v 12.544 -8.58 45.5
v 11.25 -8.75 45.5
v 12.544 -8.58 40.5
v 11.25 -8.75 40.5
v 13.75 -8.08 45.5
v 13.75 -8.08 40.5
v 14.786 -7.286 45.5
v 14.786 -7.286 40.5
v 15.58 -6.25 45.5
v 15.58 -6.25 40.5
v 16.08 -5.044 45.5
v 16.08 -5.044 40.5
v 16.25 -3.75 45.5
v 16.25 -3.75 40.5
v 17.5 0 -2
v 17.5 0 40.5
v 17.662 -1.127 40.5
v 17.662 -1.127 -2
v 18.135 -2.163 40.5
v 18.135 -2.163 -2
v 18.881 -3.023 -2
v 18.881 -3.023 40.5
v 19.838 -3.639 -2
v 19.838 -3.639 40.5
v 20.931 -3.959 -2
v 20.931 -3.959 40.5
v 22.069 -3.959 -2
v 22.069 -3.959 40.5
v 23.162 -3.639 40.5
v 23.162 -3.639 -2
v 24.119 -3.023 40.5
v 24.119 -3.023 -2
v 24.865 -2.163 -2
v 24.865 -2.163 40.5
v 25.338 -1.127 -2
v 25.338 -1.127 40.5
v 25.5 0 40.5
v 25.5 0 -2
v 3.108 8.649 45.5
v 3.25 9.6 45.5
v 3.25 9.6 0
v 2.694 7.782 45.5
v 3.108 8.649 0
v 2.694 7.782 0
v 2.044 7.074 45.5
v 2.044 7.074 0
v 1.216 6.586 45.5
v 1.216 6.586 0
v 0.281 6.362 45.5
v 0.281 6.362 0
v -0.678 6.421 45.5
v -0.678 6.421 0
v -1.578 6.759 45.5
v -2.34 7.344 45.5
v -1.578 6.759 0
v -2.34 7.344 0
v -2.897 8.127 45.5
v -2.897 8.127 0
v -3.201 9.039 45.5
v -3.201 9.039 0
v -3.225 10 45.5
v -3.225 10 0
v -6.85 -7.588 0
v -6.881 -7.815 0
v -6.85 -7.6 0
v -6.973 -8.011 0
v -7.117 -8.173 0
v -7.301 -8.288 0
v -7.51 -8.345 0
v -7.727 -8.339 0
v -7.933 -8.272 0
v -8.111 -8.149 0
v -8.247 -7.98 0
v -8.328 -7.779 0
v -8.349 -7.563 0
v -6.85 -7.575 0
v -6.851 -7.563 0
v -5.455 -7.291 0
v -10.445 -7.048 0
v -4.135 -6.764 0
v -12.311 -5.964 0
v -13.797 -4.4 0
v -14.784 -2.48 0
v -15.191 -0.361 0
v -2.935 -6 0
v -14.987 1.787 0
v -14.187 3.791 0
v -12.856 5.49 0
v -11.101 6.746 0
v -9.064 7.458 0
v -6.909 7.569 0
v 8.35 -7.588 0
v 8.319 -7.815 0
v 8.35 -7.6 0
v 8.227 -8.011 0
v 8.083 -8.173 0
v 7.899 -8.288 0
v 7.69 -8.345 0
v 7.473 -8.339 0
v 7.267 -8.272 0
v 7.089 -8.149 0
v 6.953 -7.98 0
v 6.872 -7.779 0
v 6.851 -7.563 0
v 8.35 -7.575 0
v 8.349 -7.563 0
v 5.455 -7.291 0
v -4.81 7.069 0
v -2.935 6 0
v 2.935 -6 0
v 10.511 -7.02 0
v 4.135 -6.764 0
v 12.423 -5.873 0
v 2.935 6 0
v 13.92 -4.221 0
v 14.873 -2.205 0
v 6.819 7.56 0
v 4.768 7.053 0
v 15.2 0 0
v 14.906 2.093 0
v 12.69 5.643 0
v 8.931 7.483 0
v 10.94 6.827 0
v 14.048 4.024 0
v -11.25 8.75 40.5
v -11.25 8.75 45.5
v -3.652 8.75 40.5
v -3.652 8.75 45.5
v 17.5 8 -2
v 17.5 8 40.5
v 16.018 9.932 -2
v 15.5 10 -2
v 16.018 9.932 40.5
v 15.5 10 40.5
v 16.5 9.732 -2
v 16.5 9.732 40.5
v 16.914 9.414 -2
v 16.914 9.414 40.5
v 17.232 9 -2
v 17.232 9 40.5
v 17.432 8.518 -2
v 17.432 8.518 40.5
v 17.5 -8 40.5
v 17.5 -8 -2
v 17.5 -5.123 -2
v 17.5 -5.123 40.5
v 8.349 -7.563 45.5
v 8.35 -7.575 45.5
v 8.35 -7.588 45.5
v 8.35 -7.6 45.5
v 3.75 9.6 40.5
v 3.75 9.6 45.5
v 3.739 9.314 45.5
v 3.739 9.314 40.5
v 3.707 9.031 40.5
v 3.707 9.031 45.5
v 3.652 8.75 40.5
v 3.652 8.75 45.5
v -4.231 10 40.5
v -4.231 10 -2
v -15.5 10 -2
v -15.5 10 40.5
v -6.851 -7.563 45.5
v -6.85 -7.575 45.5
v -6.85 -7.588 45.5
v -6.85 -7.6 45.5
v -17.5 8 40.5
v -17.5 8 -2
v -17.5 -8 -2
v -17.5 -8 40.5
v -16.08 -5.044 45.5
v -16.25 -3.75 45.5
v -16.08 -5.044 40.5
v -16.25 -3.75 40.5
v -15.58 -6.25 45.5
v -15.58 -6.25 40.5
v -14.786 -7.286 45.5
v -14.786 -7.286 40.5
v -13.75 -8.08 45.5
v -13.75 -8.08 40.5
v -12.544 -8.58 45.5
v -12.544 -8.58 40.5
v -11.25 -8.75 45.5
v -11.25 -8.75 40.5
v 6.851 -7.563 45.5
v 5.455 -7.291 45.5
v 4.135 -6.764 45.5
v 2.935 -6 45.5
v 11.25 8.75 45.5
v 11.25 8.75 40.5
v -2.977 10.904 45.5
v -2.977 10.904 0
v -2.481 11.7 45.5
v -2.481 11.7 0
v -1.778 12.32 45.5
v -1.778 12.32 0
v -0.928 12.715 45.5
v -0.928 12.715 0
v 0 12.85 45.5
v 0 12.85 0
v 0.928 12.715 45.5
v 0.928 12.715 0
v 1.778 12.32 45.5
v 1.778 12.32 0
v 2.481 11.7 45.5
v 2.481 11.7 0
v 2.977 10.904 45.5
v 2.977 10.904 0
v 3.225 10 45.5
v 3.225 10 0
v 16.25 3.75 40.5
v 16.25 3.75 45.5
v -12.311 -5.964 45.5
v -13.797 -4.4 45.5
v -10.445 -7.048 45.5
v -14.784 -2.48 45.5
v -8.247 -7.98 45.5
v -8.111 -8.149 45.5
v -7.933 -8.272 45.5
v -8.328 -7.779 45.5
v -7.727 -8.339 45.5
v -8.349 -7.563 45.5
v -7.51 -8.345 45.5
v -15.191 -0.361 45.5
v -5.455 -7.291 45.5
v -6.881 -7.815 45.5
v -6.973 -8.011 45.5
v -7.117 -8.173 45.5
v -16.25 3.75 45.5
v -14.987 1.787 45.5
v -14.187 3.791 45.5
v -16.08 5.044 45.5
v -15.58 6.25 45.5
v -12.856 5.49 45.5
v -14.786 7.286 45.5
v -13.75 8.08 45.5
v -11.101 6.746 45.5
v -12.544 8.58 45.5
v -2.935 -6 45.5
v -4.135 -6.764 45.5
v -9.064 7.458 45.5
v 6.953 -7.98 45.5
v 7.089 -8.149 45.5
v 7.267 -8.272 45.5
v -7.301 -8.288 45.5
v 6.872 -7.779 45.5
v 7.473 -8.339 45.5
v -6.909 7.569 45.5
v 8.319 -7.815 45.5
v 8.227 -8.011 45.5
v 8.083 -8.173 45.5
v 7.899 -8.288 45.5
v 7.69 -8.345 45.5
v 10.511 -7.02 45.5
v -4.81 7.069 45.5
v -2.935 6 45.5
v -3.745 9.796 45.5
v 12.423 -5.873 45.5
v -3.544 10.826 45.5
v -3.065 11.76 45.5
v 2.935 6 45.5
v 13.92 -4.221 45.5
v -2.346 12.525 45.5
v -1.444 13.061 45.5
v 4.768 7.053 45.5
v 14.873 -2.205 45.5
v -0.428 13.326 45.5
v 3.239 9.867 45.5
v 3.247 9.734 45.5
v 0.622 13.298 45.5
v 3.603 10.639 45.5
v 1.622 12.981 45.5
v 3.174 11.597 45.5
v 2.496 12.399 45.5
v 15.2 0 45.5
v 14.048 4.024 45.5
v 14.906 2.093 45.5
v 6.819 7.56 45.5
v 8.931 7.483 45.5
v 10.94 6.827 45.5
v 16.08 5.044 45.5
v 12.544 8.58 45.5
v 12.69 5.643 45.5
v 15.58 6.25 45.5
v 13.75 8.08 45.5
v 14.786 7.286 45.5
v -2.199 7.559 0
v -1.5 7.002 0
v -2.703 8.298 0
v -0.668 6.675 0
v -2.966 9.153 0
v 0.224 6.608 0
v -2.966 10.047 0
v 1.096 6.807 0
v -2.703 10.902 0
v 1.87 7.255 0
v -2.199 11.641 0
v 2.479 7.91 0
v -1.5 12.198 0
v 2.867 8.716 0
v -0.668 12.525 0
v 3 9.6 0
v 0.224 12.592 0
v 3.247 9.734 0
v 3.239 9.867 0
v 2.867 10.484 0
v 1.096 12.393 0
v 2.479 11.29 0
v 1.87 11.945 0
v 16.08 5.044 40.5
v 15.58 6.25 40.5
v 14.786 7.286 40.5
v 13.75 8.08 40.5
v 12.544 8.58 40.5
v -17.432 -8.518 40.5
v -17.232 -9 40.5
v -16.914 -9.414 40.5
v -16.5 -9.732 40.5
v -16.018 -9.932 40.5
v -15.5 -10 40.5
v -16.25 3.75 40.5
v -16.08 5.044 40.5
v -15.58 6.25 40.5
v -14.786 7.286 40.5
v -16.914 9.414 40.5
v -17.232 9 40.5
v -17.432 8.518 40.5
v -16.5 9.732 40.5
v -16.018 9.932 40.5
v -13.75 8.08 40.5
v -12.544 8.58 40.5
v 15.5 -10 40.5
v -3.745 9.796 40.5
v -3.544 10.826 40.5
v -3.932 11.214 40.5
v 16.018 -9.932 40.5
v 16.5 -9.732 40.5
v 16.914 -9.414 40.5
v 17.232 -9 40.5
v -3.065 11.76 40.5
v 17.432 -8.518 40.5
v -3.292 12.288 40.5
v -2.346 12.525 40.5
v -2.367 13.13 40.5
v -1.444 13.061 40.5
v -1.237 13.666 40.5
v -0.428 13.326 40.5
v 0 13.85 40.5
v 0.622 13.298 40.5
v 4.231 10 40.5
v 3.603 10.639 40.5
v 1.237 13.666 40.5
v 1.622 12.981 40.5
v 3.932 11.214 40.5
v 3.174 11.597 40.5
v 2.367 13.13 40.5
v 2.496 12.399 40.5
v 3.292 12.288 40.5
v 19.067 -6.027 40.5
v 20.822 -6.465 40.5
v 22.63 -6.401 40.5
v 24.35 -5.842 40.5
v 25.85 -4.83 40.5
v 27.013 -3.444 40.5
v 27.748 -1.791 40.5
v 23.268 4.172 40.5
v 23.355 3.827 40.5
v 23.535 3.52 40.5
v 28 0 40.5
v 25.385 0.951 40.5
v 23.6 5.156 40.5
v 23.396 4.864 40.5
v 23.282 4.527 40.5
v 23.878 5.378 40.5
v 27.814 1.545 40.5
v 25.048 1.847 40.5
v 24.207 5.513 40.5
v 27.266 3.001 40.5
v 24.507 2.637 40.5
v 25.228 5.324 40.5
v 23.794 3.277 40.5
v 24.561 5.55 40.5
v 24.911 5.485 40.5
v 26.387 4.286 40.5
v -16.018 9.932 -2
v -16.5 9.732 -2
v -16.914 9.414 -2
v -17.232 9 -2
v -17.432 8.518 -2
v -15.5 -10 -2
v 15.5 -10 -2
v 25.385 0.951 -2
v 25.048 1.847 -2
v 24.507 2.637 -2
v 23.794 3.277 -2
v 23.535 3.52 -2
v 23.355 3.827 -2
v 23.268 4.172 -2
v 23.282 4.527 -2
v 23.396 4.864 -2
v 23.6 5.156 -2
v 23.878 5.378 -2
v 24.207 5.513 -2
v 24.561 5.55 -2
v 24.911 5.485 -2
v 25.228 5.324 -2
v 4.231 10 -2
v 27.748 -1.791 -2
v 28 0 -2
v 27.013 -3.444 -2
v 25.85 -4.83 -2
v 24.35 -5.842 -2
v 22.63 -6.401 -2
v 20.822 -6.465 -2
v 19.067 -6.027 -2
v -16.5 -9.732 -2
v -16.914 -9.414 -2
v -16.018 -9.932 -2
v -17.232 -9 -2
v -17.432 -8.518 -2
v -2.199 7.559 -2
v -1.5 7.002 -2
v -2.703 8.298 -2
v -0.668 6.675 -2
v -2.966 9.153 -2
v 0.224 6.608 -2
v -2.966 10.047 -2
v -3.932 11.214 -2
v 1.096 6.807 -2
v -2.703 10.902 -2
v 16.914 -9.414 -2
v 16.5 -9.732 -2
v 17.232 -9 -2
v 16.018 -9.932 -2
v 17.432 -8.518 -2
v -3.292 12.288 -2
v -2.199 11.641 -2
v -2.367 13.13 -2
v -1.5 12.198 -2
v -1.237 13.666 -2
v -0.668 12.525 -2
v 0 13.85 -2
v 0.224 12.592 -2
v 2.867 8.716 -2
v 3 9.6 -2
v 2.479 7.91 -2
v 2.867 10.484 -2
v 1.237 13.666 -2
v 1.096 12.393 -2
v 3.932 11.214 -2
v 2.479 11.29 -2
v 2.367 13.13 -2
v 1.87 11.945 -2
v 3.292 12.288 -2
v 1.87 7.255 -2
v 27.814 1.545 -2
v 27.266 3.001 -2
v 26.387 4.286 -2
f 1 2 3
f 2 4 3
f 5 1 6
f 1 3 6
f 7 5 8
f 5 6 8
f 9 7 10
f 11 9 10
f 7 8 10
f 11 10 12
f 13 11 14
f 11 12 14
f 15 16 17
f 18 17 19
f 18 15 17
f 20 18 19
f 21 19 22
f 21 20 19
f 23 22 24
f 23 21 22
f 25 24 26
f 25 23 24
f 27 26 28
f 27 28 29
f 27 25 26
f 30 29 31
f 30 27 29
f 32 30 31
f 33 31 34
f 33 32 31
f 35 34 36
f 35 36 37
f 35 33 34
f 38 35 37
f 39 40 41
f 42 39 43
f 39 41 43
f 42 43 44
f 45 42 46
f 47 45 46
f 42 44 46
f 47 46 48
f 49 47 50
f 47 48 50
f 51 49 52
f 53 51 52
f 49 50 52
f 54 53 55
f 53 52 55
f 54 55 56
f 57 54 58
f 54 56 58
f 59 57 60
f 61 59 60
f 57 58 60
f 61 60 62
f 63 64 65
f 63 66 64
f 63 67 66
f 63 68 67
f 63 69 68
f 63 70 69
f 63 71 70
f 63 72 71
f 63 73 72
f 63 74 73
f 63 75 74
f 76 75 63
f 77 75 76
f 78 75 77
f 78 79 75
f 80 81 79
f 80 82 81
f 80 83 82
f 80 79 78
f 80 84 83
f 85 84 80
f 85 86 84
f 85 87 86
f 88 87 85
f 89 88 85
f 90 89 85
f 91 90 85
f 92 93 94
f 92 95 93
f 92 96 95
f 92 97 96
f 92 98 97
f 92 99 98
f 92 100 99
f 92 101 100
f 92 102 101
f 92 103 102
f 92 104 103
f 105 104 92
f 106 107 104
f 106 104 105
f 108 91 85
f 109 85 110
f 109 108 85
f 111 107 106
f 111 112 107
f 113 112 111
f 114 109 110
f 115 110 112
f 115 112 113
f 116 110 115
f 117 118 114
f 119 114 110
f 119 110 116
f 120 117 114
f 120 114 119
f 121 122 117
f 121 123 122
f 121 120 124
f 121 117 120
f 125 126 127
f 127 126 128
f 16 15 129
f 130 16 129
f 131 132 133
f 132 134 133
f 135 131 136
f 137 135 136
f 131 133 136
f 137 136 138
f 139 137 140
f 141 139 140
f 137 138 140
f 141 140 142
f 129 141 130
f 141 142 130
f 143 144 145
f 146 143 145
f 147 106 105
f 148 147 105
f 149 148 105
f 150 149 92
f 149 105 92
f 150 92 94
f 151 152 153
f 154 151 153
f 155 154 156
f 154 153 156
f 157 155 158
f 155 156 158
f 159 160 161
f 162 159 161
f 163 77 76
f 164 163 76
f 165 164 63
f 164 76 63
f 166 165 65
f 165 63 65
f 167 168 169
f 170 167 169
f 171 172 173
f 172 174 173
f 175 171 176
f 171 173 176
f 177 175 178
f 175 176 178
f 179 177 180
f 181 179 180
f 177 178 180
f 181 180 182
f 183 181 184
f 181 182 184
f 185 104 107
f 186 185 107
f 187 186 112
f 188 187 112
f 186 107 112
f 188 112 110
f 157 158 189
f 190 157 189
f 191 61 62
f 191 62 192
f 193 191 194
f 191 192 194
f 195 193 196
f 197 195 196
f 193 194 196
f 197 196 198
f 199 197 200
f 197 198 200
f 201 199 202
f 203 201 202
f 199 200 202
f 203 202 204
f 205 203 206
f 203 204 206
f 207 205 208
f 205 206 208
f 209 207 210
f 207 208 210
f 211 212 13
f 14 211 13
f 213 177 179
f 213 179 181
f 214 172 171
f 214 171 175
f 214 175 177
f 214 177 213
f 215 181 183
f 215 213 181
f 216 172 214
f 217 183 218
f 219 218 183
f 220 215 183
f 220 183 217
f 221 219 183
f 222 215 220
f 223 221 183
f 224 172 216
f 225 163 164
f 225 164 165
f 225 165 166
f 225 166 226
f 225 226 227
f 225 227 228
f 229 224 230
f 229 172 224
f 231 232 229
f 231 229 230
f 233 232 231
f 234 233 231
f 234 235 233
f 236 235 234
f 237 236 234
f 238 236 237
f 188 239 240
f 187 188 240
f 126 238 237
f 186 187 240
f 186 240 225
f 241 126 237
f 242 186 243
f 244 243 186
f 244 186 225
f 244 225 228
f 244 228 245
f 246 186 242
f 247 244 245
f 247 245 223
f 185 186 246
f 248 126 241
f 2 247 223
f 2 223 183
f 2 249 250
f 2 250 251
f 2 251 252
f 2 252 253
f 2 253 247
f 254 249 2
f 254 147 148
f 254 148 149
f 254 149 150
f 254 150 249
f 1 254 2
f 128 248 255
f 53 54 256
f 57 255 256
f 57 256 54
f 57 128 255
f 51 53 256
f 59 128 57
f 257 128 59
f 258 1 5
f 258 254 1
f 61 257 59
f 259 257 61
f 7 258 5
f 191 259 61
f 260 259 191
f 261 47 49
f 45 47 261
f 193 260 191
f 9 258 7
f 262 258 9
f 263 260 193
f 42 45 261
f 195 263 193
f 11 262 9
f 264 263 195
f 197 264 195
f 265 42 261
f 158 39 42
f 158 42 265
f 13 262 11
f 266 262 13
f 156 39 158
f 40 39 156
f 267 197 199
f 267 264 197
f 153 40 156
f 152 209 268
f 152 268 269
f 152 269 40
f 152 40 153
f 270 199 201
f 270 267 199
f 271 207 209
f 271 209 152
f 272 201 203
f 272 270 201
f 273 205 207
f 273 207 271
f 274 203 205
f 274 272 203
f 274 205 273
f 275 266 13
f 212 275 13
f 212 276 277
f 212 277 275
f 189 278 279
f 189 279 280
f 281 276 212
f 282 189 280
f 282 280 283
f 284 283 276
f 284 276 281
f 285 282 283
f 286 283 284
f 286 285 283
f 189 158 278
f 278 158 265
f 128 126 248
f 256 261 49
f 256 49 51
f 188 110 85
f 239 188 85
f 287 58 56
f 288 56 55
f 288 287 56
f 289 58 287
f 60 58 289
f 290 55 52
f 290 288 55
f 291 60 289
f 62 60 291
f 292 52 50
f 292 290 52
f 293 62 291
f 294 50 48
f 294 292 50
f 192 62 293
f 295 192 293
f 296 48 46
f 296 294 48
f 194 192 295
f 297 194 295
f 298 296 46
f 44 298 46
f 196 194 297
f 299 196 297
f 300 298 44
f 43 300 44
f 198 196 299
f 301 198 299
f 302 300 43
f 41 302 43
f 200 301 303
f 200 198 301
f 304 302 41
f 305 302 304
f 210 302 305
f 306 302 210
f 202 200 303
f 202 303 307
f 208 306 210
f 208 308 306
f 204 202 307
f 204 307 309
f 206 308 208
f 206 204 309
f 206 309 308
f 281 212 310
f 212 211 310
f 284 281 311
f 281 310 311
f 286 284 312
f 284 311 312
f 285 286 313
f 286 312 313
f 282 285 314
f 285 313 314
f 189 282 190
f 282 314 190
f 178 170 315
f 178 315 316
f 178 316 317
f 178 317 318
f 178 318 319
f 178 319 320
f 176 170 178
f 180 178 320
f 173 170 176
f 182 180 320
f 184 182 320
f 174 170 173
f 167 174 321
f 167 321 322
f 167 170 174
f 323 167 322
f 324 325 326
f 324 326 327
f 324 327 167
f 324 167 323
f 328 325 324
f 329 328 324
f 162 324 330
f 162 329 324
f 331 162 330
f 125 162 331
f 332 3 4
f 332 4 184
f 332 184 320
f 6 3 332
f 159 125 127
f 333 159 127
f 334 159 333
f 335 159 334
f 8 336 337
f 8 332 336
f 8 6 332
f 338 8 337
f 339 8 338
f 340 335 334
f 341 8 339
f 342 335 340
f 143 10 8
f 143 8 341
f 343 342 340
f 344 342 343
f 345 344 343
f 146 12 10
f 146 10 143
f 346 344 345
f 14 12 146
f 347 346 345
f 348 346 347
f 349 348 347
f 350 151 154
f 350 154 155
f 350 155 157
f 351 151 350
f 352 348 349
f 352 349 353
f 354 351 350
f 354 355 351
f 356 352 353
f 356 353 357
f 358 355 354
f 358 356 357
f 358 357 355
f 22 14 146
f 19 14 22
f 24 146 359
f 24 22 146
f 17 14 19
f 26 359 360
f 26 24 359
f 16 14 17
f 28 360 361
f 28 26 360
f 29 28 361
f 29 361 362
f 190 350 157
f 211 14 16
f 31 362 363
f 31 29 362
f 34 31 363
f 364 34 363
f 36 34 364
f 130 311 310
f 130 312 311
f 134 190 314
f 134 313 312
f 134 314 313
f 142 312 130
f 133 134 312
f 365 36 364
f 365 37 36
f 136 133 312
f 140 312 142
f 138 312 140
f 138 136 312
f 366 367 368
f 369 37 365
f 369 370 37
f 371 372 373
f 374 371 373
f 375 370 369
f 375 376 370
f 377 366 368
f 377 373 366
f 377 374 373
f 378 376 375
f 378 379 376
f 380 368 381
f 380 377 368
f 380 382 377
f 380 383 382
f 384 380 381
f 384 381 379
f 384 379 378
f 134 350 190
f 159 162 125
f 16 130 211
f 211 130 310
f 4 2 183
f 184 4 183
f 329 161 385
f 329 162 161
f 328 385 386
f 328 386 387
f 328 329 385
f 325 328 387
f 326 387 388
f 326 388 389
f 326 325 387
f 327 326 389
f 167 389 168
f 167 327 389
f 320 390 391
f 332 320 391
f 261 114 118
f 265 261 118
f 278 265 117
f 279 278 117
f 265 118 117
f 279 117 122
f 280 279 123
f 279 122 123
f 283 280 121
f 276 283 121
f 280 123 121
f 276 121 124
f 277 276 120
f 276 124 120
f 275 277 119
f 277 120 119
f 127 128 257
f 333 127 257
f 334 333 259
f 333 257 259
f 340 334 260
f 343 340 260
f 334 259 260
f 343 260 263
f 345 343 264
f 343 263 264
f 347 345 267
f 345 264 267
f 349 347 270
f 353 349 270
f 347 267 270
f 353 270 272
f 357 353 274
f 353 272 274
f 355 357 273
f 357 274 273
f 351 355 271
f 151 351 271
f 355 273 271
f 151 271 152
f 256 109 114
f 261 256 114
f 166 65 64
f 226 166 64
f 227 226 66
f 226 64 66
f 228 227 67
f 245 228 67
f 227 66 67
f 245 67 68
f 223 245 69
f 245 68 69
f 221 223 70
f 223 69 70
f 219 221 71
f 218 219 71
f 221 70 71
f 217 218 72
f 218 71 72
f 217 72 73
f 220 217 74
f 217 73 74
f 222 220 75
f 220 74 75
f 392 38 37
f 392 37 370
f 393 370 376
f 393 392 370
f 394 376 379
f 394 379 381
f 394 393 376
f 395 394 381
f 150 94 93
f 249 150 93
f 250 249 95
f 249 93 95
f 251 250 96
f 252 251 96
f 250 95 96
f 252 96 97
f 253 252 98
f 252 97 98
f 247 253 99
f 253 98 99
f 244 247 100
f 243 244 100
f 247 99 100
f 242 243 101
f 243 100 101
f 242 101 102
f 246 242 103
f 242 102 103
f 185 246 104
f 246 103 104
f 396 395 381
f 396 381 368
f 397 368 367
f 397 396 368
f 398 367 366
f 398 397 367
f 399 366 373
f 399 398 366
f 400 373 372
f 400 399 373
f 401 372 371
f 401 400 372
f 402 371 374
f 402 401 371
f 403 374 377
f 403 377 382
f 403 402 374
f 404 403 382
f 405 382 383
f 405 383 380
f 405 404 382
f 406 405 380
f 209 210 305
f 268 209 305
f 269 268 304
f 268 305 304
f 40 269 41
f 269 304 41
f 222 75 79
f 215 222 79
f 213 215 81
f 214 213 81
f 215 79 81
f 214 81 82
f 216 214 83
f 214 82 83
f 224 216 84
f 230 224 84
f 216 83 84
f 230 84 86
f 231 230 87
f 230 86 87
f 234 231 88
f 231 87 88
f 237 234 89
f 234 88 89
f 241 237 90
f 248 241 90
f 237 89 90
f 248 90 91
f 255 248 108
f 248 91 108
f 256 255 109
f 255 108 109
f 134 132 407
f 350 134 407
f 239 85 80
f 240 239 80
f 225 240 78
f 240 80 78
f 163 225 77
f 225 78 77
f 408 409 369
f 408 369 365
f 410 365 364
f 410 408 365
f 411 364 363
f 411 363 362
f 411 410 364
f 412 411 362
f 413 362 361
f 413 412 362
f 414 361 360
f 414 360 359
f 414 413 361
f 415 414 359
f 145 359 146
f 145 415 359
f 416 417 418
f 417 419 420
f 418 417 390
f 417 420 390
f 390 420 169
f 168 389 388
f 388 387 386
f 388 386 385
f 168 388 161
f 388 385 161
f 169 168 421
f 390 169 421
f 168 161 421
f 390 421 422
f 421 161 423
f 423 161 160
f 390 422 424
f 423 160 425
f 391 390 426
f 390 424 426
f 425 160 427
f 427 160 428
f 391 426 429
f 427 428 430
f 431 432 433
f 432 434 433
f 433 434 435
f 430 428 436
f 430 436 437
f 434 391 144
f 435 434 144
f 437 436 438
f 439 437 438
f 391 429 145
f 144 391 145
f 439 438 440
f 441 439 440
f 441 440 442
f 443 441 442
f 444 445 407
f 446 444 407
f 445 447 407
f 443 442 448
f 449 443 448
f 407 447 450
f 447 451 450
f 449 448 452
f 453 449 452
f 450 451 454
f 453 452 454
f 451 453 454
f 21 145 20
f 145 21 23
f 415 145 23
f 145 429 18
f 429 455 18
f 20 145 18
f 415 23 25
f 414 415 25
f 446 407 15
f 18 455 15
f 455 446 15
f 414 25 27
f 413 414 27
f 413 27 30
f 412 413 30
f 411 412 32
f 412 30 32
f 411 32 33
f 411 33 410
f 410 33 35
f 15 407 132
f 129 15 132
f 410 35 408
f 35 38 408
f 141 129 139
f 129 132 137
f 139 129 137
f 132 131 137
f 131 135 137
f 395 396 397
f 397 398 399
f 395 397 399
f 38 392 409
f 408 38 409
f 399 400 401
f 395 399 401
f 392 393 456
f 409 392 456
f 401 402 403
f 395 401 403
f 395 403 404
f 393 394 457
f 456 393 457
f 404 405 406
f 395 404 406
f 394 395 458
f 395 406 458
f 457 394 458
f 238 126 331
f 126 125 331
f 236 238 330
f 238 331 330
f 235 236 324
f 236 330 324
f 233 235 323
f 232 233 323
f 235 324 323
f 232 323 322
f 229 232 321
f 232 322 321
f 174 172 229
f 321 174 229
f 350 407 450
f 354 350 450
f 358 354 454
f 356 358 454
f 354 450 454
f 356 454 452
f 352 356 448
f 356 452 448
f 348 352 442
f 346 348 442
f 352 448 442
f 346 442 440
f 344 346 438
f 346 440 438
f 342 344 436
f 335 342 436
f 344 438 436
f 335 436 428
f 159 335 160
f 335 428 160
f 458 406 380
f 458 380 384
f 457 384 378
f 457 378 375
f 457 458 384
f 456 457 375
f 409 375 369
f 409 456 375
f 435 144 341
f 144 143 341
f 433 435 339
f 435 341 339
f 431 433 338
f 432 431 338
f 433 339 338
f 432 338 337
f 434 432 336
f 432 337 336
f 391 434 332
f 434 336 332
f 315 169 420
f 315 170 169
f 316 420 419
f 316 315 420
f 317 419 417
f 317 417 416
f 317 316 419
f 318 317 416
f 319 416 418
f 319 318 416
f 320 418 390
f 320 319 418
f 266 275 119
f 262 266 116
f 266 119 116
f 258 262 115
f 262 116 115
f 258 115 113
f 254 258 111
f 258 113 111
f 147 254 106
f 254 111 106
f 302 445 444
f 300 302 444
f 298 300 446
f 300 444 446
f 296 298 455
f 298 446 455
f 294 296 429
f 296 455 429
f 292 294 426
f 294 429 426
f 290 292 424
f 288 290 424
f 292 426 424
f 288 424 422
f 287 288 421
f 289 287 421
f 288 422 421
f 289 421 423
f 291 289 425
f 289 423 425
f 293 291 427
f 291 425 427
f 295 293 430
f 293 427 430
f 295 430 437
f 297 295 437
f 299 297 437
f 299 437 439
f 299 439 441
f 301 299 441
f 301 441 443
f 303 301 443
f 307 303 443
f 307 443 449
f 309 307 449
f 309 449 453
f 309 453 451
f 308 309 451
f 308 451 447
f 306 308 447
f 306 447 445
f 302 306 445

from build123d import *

# Parameters (mm, degrees)
F1_DEPTH  = 2
F2_DEPTH  = 45.5
F4_DEPTH  = 5
F5_R      = 2
F6_R      = 5
F8_DEPTH  = 42.5
F9_R      = 3
F10_DEPTH = 47.501


with BuildPart() as f1:
    # F0 (on Top) → F1 (new body)
    with BuildSketch(Plane.XY):
        with BuildLine():
            ThreePointArc((4.2311346427, 10), (0, 13.850000456), (-4.2311346427, 10))
            Line((-4.2311346427, 10), (-3.2252907411, 10))
            ThreePointArc((-3.2252907411, 10), (0, 12.850000456), (3.2252907411, 10))
            Line((3.2252907411, 10), (4.2311346427, 10))
        make_face()
        with BuildLine():
            Line((3.2252907411, 10), (-3.2252907411, 10))
            ThreePointArc((-3.2252907411, 10), (-0.2003810013, 6.3561836525), (3.25, 9.600000456))
            ThreePointArc((3.25, 9.600000456), (3.2438168034, 9.8003814573), (3.2252907411, 10))
        make_face()
        with BuildLine():
            ThreePointArc((3.2252907411, 10), (0, 12.850000456), (-3.2252907411, 10))
            Line((-3.2252907411, 10), (3.2252907411, 10))
        make_face()
        with BuildLine():
            ThreePointArc((-2.9352384841, 6), (-0.7731344117, 3.3397464334), (0, 0))
            ThreePointArc((0, 0), (0.7731344117, 3.3397464334), (2.9352384841, 6))
            Line((2.9352384841, 6), (2.2588706729, 6))
            ThreePointArc((2.2588706729, 6), (0, 5.350000456), (-2.2588706729, 6))
            Line((-2.2588706729, 6), (-2.9352384841, 6))
        make_face()
        with BuildLine():
            ThreePointArc((2.9352384841, -6), (0.7731344117, -3.3397464334), (0, 0))
            ThreePointArc((0, 0), (-0.7731344117, -3.3397464334), (-2.9352384841, -6))
            Line((-2.9352384841, -6), (2.9352384841, -6))
        make_face()
        with BuildLine():
            ThreePointArc((-4.2311346427, 10), (-3.8118292524, 7.7205170826), (-2.2588706729, 6))
            Line((-2.2588706729, 6), (2.2588706729, 6))
            ThreePointArc((2.2588706729, 6), (3.7190523228, 7.543024564), (4.25, 9.600000456))
            ThreePointArc((4.25, 9.600000456), (4.2452810408, 9.8002225432), (4.2311346427, 10))
            Line((4.2311346427, 10), (3.2252907411, 10))
            ThreePointArc((3.2252907411, 10), (3.2438168034, 9.8003814573), (3.25, 9.600000456))
            ThreePointArc((3.25, 9.600000456), (-0.2003810013, 6.3561836525), (-3.2252907411, 10))
            Line((-3.2252907411, 10), (-4.2311346427, 10))
        make_face()
        with BuildLine():
            ThreePointArc((-2.9352384841, -6), (-0.7731344117, -3.3397464334), (0, 0))
            ThreePointArc((0, 0), (-0.7731344117, 3.3397464334), (-2.9352384841, 6))
            ThreePointArc((-2.9352384841, 6), (-14.6584577236, 2.8174766307), (-8.3490864524, -7.5629934211))
            ThreePointArc((-8.3490864524, -7.5629934211), (-7.6, -6.85), (-6.8509135476, -7.5629934211))
            ThreePointArc((-6.8509135476, -7.5629934211), (-4.7825233693, -7.0584577236), (-2.9352384841, -6))
        make_face()
        with BuildLine():
            ThreePointArc((2.9352384841, 6), (0.7731344117, 3.3397464334), (0, 0))
            ThreePointArc((0, 0), (0.7731344117, -3.3397464334), (2.9352384841, -6))
            ThreePointArc((2.9352384841, -6), (4.7825233693, -7.0584577236), (6.8509135476, -7.5629934211))
            ThreePointArc((6.8509135476, -7.5629934211), (7.6, -6.85), (8.3490864524, -7.5629934211))
            ThreePointArc((8.3490864524, -7.5629934211), (13.2326306926, -5.1023006067), (15.2, 0))
            ThreePointArc((15.2, 0), (10.9397464334, 6.8268655883), (2.9352384841, 6))
        make_face()
        with BuildLine():
            ThreePointArc((-8.3490864524, -7.5629934211), (-14.6584577236, 2.8174766307), (-2.9352384841, 6))
            Line((-2.9352384841, 6), (-2.2588706729, 6))
            ThreePointArc((-2.2588706729, 6), (-3.8118292524, 7.7205170826), (-4.2311346427, 10))
            Line((-4.2311346427, 10), (-17.5, 10))
            Line((-17.5, 10), (-17.5, -10))
            Line((-17.5, -10), (17.5, -10))
            Line((17.5, -10), (17.5, 10))
            Line((17.5, 10), (4.2311346427, 10))
            ThreePointArc((4.2311346427, 10), (4.2452810408, 9.8002225432), (4.25, 9.600000456))
            ThreePointArc((4.25, 9.600000456), (3.7190523228, 7.543024564), (2.2588706729, 6))
            Line((2.2588706729, 6), (2.9352384841, 6))
            ThreePointArc((2.9352384841, 6), (10.9397464334, 6.8268655883), (15.2, 0))
            ThreePointArc((15.2, 0), (13.2326306926, -5.1023006067), (8.3490864524, -7.5629934211))
            ThreePointArc((8.3490864524, -7.5629934211), (8.3497715783, -7.5814910734), (8.35, -7.6))
            ThreePointArc((8.35, -7.6), (7.5814910734, -8.3497715783), (6.8509135476, -7.5629934211))
            ThreePointArc((6.8509135476, -7.5629934211), (4.7825233693, -7.0584577236), (2.9352384841, -6))
            Line((2.9352384841, -6), (-2.9352384841, -6))
            ThreePointArc((-2.9352384841, -6), (-4.7825233693, -7.0584577236), (-6.8509135476, -7.5629934211))
            ThreePointArc((-6.8509135476, -7.5629934211), (-6.8502284217, -7.5814910734), (-6.85, -7.6))
            ThreePointArc((-6.85, -7.6), (-7.6185089266, -8.3497715783), (-8.3490864524, -7.5629934211))
        make_face()
        with BuildLine():
            ThreePointArc((-6.8509135476, -7.5629934211), (-7.6, -6.85), (-8.3490864524, -7.5629934211))
            ThreePointArc((-8.3490864524, -7.5629934211), (-7.6, -7.6), (-6.8509135476, -7.5629934211))
        make_face()
        with BuildLine():
            ThreePointArc((-6.8509135476, -7.5629934211), (-7.6, -7.6), (-8.3490864524, -7.5629934211))
            ThreePointArc((-8.3490864524, -7.5629934211), (-7.6185089266, -8.3497715783), (-6.85, -7.6))
            ThreePointArc((-6.85, -7.6), (-6.8502284217, -7.5814910734), (-6.8509135476, -7.5629934211))
        make_face()
        with BuildLine():
            ThreePointArc((8.3490864524, -7.5629934211), (7.6, -6.85), (6.8509135476, -7.5629934211))
            ThreePointArc((6.8509135476, -7.5629934211), (7.6, -7.6), (8.3490864524, -7.5629934211))
        make_face()
        with BuildLine():
            ThreePointArc((8.3490864524, -7.5629934211), (7.6, -7.6), (6.8509135476, -7.5629934211))
            ThreePointArc((6.8509135476, -7.5629934211), (7.5814910734, -8.3497715783), (8.35, -7.6))
            ThreePointArc((8.35, -7.6), (8.3497715783, -7.5814910734), (8.3490864524, -7.5629934211))
        make_face()
        with BuildLine():
            Line((2.2588706729, 6), (-2.2588706729, 6))
            ThreePointArc((-2.2588706729, 6), (0, 5.350000456), (2.2588706729, 6))
        make_face()
    extrude(amount=-F1_DEPTH)

    # F0 (on Top) → F2 (join)
    with BuildSketch(Plane.XY):
        with BuildLine():
            ThreePointArc((-8.3490864524, -7.5629934211), (-14.6584577236, 2.8174766307), (-2.9352384841, 6))
            Line((-2.9352384841, 6), (-2.2588706729, 6))
            ThreePointArc((-2.2588706729, 6), (-3.8118292524, 7.7205170826), (-4.2311346427, 10))
            Line((-4.2311346427, 10), (-17.5, 10))
            Line((-17.5, 10), (-17.5, -10))
            Line((-17.5, -10), (17.5, -10))
            Line((17.5, -10), (17.5, 10))
            Line((17.5, 10), (4.2311346427, 10))
            ThreePointArc((4.2311346427, 10), (4.2452810408, 9.8002225432), (4.25, 9.600000456))
            ThreePointArc((4.25, 9.600000456), (3.7190523228, 7.543024564), (2.2588706729, 6))
            Line((2.2588706729, 6), (2.9352384841, 6))
            ThreePointArc((2.9352384841, 6), (10.9397464334, 6.8268655883), (15.2, 0))
            ThreePointArc((15.2, 0), (13.2326306926, -5.1023006067), (8.3490864524, -7.5629934211))
            ThreePointArc((8.3490864524, -7.5629934211), (8.3497715783, -7.5814910734), (8.35, -7.6))
            ThreePointArc((8.35, -7.6), (7.5814910734, -8.3497715783), (6.8509135476, -7.5629934211))
            ThreePointArc((6.8509135476, -7.5629934211), (4.7825233693, -7.0584577236), (2.9352384841, -6))
            Line((2.9352384841, -6), (-2.9352384841, -6))
            ThreePointArc((-2.9352384841, -6), (-4.7825233693, -7.0584577236), (-6.8509135476, -7.5629934211))
            ThreePointArc((-6.8509135476, -7.5629934211), (-6.8502284217, -7.5814910734), (-6.85, -7.6))
            ThreePointArc((-6.85, -7.6), (-7.6185089266, -8.3497715783), (-8.3490864524, -7.5629934211))
        make_face()
        with BuildLine():
            ThreePointArc((4.2311346427, 10), (0, 13.850000456), (-4.2311346427, 10))
            Line((-4.2311346427, 10), (-3.2252907411, 10))
            ThreePointArc((-3.2252907411, 10), (0, 12.850000456), (3.2252907411, 10))
            Line((3.2252907411, 10), (4.2311346427, 10))
        make_face()
        with BuildLine():
            ThreePointArc((-4.2311346427, 10), (-3.8118292524, 7.7205170826), (-2.2588706729, 6))
            Line((-2.2588706729, 6), (2.2588706729, 6))
            ThreePointArc((2.2588706729, 6), (3.7190523228, 7.543024564), (4.25, 9.600000456))
            ThreePointArc((4.25, 9.600000456), (4.2452810408, 9.8002225432), (4.2311346427, 10))
            Line((4.2311346427, 10), (3.2252907411, 10))
            ThreePointArc((3.2252907411, 10), (3.2438168034, 9.8003814573), (3.25, 9.600000456))
            ThreePointArc((3.25, 9.600000456), (-0.2003810013, 6.3561836525), (-3.2252907411, 10))
            Line((-3.2252907411, 10), (-4.2311346427, 10))
        make_face()
    extrude(amount=F2_DEPTH)

    # F3 (on face) → F4 (cut)
    with BuildSketch(Plane.XY.offset(45.5)):
        with BuildLine():
            ThreePointArc((4.2311346427, 10), (0, 13.850000456), (-4.2311346427, 10))
            Line((-4.2311346427, 10), (-17.5, 10))
            Line((-17.5, 10), (-17.5, -10))
            Line((-17.5, -10), (17.5, -10))
            Line((17.5, -10), (17.5, 10))
            Line((17.5, 10), (4.2311346427, 10))
        make_face()
        with BuildLine():
            Line((3.6523963674, 8.75), (16.25, 8.75))
            Line((16.25, 8.75), (16.25, -8.75))
            Line((16.25, -8.75), (-16.25, -8.75))
            Line((-16.25, -8.75), (-16.25, 8.75))
            Line((-16.25, 8.75), (-3.6523963674, 8.75))
            ThreePointArc((-3.6523963674, 8.75), (-0.4277929535, 13.3255196398), (3.75, 9.600000456))
            ThreePointArc((3.75, 9.600000456), (3.7255191838, 9.1722075025), (3.6523963674, 8.75))
        make_face(mode=Mode.SUBTRACT)
    extrude(amount=-F4_DEPTH, mode=Mode.SUBTRACT)

    # F5
    f5_edges = [f1.edges().sort_by_distance(p)[0] for p in [
        (17.5, -10, 19.25),
        (17.5, 10, 19.25),
        (-17.5, 10, 19.25),
        (-17.5, -10, 19.25),
    ]]
    fillet(f5_edges, radius=F5_R)

    # F6
    f6_edges = [f1.edges().sort_by_distance(p)[0] for p in [
        (16.25, -8.75, 43),
        (16.25, 8.75, 43),
        (-16.25, 8.75, 43),
        (-16.25, -8.75, 43),
    ]]
    fillet(f6_edges, radius=F6_R)

    # F7 (on face) → F8 (join)
    with BuildSketch(Plane(origin=(0, 0, -2), x_dir=(1, 0, 0), z_dir=(0, 0, -1))):
        with BuildLine():
            ThreePointArc((17.5, 0), (21.5, 4), (25.5, 0))
            ThreePointArc((25.5, 0), (25.0480433512, -1.8469944174), (23.794305811, -3.2766081312))
            ThreePointArc((23.794305811, -3.2766081312), (25.0884620929, -3.1917847095), (25.7612762908, -4.3005482325))
            ThreePointArc((25.7612762908, -4.3005482325), (25.6200398184, -4.8777340259), (25.2282467868, -5.3244883225))
            ThreePointArc((25.2282467868, -5.3244883225), (27.2655704017, -3.0013660128), (28, 0))
            ThreePointArc((28, 0), (24.3504385627, 5.8416607228), (17.5, 5.123475383))
            Line((17.5, 5.123475383), (17.5, 0))
        make_face()
        with BuildLine():
            ThreePointArc((25.7612762908, -4.3005482325), (25.0884620929, -3.1917847095), (23.794305811, -3.2766081312))
            ThreePointArc((23.794305811, -3.2766081312), (23.4873361952, -5.0175187204), (25.2282467868, -5.3244883225))
            ThreePointArc((25.2282467868, -5.3244883225), (25.6200398184, -4.8777340259), (25.7612762908, -4.3005482325))
        make_face()
    extrude(amount=-F8_DEPTH)

    # F9 (on face) → F10 (cut, through all)
    with BuildSketch(Plane(origin=(0, 0, -2), x_dir=(1, 0, 0), z_dir=(0, 0, -1))):
        with Locations((0, -9.600000456)):
            Circle(F9_R)
    extrude(amount=-F10_DEPTH, mode=Mode.SUBTRACT)


solid = f1.part
